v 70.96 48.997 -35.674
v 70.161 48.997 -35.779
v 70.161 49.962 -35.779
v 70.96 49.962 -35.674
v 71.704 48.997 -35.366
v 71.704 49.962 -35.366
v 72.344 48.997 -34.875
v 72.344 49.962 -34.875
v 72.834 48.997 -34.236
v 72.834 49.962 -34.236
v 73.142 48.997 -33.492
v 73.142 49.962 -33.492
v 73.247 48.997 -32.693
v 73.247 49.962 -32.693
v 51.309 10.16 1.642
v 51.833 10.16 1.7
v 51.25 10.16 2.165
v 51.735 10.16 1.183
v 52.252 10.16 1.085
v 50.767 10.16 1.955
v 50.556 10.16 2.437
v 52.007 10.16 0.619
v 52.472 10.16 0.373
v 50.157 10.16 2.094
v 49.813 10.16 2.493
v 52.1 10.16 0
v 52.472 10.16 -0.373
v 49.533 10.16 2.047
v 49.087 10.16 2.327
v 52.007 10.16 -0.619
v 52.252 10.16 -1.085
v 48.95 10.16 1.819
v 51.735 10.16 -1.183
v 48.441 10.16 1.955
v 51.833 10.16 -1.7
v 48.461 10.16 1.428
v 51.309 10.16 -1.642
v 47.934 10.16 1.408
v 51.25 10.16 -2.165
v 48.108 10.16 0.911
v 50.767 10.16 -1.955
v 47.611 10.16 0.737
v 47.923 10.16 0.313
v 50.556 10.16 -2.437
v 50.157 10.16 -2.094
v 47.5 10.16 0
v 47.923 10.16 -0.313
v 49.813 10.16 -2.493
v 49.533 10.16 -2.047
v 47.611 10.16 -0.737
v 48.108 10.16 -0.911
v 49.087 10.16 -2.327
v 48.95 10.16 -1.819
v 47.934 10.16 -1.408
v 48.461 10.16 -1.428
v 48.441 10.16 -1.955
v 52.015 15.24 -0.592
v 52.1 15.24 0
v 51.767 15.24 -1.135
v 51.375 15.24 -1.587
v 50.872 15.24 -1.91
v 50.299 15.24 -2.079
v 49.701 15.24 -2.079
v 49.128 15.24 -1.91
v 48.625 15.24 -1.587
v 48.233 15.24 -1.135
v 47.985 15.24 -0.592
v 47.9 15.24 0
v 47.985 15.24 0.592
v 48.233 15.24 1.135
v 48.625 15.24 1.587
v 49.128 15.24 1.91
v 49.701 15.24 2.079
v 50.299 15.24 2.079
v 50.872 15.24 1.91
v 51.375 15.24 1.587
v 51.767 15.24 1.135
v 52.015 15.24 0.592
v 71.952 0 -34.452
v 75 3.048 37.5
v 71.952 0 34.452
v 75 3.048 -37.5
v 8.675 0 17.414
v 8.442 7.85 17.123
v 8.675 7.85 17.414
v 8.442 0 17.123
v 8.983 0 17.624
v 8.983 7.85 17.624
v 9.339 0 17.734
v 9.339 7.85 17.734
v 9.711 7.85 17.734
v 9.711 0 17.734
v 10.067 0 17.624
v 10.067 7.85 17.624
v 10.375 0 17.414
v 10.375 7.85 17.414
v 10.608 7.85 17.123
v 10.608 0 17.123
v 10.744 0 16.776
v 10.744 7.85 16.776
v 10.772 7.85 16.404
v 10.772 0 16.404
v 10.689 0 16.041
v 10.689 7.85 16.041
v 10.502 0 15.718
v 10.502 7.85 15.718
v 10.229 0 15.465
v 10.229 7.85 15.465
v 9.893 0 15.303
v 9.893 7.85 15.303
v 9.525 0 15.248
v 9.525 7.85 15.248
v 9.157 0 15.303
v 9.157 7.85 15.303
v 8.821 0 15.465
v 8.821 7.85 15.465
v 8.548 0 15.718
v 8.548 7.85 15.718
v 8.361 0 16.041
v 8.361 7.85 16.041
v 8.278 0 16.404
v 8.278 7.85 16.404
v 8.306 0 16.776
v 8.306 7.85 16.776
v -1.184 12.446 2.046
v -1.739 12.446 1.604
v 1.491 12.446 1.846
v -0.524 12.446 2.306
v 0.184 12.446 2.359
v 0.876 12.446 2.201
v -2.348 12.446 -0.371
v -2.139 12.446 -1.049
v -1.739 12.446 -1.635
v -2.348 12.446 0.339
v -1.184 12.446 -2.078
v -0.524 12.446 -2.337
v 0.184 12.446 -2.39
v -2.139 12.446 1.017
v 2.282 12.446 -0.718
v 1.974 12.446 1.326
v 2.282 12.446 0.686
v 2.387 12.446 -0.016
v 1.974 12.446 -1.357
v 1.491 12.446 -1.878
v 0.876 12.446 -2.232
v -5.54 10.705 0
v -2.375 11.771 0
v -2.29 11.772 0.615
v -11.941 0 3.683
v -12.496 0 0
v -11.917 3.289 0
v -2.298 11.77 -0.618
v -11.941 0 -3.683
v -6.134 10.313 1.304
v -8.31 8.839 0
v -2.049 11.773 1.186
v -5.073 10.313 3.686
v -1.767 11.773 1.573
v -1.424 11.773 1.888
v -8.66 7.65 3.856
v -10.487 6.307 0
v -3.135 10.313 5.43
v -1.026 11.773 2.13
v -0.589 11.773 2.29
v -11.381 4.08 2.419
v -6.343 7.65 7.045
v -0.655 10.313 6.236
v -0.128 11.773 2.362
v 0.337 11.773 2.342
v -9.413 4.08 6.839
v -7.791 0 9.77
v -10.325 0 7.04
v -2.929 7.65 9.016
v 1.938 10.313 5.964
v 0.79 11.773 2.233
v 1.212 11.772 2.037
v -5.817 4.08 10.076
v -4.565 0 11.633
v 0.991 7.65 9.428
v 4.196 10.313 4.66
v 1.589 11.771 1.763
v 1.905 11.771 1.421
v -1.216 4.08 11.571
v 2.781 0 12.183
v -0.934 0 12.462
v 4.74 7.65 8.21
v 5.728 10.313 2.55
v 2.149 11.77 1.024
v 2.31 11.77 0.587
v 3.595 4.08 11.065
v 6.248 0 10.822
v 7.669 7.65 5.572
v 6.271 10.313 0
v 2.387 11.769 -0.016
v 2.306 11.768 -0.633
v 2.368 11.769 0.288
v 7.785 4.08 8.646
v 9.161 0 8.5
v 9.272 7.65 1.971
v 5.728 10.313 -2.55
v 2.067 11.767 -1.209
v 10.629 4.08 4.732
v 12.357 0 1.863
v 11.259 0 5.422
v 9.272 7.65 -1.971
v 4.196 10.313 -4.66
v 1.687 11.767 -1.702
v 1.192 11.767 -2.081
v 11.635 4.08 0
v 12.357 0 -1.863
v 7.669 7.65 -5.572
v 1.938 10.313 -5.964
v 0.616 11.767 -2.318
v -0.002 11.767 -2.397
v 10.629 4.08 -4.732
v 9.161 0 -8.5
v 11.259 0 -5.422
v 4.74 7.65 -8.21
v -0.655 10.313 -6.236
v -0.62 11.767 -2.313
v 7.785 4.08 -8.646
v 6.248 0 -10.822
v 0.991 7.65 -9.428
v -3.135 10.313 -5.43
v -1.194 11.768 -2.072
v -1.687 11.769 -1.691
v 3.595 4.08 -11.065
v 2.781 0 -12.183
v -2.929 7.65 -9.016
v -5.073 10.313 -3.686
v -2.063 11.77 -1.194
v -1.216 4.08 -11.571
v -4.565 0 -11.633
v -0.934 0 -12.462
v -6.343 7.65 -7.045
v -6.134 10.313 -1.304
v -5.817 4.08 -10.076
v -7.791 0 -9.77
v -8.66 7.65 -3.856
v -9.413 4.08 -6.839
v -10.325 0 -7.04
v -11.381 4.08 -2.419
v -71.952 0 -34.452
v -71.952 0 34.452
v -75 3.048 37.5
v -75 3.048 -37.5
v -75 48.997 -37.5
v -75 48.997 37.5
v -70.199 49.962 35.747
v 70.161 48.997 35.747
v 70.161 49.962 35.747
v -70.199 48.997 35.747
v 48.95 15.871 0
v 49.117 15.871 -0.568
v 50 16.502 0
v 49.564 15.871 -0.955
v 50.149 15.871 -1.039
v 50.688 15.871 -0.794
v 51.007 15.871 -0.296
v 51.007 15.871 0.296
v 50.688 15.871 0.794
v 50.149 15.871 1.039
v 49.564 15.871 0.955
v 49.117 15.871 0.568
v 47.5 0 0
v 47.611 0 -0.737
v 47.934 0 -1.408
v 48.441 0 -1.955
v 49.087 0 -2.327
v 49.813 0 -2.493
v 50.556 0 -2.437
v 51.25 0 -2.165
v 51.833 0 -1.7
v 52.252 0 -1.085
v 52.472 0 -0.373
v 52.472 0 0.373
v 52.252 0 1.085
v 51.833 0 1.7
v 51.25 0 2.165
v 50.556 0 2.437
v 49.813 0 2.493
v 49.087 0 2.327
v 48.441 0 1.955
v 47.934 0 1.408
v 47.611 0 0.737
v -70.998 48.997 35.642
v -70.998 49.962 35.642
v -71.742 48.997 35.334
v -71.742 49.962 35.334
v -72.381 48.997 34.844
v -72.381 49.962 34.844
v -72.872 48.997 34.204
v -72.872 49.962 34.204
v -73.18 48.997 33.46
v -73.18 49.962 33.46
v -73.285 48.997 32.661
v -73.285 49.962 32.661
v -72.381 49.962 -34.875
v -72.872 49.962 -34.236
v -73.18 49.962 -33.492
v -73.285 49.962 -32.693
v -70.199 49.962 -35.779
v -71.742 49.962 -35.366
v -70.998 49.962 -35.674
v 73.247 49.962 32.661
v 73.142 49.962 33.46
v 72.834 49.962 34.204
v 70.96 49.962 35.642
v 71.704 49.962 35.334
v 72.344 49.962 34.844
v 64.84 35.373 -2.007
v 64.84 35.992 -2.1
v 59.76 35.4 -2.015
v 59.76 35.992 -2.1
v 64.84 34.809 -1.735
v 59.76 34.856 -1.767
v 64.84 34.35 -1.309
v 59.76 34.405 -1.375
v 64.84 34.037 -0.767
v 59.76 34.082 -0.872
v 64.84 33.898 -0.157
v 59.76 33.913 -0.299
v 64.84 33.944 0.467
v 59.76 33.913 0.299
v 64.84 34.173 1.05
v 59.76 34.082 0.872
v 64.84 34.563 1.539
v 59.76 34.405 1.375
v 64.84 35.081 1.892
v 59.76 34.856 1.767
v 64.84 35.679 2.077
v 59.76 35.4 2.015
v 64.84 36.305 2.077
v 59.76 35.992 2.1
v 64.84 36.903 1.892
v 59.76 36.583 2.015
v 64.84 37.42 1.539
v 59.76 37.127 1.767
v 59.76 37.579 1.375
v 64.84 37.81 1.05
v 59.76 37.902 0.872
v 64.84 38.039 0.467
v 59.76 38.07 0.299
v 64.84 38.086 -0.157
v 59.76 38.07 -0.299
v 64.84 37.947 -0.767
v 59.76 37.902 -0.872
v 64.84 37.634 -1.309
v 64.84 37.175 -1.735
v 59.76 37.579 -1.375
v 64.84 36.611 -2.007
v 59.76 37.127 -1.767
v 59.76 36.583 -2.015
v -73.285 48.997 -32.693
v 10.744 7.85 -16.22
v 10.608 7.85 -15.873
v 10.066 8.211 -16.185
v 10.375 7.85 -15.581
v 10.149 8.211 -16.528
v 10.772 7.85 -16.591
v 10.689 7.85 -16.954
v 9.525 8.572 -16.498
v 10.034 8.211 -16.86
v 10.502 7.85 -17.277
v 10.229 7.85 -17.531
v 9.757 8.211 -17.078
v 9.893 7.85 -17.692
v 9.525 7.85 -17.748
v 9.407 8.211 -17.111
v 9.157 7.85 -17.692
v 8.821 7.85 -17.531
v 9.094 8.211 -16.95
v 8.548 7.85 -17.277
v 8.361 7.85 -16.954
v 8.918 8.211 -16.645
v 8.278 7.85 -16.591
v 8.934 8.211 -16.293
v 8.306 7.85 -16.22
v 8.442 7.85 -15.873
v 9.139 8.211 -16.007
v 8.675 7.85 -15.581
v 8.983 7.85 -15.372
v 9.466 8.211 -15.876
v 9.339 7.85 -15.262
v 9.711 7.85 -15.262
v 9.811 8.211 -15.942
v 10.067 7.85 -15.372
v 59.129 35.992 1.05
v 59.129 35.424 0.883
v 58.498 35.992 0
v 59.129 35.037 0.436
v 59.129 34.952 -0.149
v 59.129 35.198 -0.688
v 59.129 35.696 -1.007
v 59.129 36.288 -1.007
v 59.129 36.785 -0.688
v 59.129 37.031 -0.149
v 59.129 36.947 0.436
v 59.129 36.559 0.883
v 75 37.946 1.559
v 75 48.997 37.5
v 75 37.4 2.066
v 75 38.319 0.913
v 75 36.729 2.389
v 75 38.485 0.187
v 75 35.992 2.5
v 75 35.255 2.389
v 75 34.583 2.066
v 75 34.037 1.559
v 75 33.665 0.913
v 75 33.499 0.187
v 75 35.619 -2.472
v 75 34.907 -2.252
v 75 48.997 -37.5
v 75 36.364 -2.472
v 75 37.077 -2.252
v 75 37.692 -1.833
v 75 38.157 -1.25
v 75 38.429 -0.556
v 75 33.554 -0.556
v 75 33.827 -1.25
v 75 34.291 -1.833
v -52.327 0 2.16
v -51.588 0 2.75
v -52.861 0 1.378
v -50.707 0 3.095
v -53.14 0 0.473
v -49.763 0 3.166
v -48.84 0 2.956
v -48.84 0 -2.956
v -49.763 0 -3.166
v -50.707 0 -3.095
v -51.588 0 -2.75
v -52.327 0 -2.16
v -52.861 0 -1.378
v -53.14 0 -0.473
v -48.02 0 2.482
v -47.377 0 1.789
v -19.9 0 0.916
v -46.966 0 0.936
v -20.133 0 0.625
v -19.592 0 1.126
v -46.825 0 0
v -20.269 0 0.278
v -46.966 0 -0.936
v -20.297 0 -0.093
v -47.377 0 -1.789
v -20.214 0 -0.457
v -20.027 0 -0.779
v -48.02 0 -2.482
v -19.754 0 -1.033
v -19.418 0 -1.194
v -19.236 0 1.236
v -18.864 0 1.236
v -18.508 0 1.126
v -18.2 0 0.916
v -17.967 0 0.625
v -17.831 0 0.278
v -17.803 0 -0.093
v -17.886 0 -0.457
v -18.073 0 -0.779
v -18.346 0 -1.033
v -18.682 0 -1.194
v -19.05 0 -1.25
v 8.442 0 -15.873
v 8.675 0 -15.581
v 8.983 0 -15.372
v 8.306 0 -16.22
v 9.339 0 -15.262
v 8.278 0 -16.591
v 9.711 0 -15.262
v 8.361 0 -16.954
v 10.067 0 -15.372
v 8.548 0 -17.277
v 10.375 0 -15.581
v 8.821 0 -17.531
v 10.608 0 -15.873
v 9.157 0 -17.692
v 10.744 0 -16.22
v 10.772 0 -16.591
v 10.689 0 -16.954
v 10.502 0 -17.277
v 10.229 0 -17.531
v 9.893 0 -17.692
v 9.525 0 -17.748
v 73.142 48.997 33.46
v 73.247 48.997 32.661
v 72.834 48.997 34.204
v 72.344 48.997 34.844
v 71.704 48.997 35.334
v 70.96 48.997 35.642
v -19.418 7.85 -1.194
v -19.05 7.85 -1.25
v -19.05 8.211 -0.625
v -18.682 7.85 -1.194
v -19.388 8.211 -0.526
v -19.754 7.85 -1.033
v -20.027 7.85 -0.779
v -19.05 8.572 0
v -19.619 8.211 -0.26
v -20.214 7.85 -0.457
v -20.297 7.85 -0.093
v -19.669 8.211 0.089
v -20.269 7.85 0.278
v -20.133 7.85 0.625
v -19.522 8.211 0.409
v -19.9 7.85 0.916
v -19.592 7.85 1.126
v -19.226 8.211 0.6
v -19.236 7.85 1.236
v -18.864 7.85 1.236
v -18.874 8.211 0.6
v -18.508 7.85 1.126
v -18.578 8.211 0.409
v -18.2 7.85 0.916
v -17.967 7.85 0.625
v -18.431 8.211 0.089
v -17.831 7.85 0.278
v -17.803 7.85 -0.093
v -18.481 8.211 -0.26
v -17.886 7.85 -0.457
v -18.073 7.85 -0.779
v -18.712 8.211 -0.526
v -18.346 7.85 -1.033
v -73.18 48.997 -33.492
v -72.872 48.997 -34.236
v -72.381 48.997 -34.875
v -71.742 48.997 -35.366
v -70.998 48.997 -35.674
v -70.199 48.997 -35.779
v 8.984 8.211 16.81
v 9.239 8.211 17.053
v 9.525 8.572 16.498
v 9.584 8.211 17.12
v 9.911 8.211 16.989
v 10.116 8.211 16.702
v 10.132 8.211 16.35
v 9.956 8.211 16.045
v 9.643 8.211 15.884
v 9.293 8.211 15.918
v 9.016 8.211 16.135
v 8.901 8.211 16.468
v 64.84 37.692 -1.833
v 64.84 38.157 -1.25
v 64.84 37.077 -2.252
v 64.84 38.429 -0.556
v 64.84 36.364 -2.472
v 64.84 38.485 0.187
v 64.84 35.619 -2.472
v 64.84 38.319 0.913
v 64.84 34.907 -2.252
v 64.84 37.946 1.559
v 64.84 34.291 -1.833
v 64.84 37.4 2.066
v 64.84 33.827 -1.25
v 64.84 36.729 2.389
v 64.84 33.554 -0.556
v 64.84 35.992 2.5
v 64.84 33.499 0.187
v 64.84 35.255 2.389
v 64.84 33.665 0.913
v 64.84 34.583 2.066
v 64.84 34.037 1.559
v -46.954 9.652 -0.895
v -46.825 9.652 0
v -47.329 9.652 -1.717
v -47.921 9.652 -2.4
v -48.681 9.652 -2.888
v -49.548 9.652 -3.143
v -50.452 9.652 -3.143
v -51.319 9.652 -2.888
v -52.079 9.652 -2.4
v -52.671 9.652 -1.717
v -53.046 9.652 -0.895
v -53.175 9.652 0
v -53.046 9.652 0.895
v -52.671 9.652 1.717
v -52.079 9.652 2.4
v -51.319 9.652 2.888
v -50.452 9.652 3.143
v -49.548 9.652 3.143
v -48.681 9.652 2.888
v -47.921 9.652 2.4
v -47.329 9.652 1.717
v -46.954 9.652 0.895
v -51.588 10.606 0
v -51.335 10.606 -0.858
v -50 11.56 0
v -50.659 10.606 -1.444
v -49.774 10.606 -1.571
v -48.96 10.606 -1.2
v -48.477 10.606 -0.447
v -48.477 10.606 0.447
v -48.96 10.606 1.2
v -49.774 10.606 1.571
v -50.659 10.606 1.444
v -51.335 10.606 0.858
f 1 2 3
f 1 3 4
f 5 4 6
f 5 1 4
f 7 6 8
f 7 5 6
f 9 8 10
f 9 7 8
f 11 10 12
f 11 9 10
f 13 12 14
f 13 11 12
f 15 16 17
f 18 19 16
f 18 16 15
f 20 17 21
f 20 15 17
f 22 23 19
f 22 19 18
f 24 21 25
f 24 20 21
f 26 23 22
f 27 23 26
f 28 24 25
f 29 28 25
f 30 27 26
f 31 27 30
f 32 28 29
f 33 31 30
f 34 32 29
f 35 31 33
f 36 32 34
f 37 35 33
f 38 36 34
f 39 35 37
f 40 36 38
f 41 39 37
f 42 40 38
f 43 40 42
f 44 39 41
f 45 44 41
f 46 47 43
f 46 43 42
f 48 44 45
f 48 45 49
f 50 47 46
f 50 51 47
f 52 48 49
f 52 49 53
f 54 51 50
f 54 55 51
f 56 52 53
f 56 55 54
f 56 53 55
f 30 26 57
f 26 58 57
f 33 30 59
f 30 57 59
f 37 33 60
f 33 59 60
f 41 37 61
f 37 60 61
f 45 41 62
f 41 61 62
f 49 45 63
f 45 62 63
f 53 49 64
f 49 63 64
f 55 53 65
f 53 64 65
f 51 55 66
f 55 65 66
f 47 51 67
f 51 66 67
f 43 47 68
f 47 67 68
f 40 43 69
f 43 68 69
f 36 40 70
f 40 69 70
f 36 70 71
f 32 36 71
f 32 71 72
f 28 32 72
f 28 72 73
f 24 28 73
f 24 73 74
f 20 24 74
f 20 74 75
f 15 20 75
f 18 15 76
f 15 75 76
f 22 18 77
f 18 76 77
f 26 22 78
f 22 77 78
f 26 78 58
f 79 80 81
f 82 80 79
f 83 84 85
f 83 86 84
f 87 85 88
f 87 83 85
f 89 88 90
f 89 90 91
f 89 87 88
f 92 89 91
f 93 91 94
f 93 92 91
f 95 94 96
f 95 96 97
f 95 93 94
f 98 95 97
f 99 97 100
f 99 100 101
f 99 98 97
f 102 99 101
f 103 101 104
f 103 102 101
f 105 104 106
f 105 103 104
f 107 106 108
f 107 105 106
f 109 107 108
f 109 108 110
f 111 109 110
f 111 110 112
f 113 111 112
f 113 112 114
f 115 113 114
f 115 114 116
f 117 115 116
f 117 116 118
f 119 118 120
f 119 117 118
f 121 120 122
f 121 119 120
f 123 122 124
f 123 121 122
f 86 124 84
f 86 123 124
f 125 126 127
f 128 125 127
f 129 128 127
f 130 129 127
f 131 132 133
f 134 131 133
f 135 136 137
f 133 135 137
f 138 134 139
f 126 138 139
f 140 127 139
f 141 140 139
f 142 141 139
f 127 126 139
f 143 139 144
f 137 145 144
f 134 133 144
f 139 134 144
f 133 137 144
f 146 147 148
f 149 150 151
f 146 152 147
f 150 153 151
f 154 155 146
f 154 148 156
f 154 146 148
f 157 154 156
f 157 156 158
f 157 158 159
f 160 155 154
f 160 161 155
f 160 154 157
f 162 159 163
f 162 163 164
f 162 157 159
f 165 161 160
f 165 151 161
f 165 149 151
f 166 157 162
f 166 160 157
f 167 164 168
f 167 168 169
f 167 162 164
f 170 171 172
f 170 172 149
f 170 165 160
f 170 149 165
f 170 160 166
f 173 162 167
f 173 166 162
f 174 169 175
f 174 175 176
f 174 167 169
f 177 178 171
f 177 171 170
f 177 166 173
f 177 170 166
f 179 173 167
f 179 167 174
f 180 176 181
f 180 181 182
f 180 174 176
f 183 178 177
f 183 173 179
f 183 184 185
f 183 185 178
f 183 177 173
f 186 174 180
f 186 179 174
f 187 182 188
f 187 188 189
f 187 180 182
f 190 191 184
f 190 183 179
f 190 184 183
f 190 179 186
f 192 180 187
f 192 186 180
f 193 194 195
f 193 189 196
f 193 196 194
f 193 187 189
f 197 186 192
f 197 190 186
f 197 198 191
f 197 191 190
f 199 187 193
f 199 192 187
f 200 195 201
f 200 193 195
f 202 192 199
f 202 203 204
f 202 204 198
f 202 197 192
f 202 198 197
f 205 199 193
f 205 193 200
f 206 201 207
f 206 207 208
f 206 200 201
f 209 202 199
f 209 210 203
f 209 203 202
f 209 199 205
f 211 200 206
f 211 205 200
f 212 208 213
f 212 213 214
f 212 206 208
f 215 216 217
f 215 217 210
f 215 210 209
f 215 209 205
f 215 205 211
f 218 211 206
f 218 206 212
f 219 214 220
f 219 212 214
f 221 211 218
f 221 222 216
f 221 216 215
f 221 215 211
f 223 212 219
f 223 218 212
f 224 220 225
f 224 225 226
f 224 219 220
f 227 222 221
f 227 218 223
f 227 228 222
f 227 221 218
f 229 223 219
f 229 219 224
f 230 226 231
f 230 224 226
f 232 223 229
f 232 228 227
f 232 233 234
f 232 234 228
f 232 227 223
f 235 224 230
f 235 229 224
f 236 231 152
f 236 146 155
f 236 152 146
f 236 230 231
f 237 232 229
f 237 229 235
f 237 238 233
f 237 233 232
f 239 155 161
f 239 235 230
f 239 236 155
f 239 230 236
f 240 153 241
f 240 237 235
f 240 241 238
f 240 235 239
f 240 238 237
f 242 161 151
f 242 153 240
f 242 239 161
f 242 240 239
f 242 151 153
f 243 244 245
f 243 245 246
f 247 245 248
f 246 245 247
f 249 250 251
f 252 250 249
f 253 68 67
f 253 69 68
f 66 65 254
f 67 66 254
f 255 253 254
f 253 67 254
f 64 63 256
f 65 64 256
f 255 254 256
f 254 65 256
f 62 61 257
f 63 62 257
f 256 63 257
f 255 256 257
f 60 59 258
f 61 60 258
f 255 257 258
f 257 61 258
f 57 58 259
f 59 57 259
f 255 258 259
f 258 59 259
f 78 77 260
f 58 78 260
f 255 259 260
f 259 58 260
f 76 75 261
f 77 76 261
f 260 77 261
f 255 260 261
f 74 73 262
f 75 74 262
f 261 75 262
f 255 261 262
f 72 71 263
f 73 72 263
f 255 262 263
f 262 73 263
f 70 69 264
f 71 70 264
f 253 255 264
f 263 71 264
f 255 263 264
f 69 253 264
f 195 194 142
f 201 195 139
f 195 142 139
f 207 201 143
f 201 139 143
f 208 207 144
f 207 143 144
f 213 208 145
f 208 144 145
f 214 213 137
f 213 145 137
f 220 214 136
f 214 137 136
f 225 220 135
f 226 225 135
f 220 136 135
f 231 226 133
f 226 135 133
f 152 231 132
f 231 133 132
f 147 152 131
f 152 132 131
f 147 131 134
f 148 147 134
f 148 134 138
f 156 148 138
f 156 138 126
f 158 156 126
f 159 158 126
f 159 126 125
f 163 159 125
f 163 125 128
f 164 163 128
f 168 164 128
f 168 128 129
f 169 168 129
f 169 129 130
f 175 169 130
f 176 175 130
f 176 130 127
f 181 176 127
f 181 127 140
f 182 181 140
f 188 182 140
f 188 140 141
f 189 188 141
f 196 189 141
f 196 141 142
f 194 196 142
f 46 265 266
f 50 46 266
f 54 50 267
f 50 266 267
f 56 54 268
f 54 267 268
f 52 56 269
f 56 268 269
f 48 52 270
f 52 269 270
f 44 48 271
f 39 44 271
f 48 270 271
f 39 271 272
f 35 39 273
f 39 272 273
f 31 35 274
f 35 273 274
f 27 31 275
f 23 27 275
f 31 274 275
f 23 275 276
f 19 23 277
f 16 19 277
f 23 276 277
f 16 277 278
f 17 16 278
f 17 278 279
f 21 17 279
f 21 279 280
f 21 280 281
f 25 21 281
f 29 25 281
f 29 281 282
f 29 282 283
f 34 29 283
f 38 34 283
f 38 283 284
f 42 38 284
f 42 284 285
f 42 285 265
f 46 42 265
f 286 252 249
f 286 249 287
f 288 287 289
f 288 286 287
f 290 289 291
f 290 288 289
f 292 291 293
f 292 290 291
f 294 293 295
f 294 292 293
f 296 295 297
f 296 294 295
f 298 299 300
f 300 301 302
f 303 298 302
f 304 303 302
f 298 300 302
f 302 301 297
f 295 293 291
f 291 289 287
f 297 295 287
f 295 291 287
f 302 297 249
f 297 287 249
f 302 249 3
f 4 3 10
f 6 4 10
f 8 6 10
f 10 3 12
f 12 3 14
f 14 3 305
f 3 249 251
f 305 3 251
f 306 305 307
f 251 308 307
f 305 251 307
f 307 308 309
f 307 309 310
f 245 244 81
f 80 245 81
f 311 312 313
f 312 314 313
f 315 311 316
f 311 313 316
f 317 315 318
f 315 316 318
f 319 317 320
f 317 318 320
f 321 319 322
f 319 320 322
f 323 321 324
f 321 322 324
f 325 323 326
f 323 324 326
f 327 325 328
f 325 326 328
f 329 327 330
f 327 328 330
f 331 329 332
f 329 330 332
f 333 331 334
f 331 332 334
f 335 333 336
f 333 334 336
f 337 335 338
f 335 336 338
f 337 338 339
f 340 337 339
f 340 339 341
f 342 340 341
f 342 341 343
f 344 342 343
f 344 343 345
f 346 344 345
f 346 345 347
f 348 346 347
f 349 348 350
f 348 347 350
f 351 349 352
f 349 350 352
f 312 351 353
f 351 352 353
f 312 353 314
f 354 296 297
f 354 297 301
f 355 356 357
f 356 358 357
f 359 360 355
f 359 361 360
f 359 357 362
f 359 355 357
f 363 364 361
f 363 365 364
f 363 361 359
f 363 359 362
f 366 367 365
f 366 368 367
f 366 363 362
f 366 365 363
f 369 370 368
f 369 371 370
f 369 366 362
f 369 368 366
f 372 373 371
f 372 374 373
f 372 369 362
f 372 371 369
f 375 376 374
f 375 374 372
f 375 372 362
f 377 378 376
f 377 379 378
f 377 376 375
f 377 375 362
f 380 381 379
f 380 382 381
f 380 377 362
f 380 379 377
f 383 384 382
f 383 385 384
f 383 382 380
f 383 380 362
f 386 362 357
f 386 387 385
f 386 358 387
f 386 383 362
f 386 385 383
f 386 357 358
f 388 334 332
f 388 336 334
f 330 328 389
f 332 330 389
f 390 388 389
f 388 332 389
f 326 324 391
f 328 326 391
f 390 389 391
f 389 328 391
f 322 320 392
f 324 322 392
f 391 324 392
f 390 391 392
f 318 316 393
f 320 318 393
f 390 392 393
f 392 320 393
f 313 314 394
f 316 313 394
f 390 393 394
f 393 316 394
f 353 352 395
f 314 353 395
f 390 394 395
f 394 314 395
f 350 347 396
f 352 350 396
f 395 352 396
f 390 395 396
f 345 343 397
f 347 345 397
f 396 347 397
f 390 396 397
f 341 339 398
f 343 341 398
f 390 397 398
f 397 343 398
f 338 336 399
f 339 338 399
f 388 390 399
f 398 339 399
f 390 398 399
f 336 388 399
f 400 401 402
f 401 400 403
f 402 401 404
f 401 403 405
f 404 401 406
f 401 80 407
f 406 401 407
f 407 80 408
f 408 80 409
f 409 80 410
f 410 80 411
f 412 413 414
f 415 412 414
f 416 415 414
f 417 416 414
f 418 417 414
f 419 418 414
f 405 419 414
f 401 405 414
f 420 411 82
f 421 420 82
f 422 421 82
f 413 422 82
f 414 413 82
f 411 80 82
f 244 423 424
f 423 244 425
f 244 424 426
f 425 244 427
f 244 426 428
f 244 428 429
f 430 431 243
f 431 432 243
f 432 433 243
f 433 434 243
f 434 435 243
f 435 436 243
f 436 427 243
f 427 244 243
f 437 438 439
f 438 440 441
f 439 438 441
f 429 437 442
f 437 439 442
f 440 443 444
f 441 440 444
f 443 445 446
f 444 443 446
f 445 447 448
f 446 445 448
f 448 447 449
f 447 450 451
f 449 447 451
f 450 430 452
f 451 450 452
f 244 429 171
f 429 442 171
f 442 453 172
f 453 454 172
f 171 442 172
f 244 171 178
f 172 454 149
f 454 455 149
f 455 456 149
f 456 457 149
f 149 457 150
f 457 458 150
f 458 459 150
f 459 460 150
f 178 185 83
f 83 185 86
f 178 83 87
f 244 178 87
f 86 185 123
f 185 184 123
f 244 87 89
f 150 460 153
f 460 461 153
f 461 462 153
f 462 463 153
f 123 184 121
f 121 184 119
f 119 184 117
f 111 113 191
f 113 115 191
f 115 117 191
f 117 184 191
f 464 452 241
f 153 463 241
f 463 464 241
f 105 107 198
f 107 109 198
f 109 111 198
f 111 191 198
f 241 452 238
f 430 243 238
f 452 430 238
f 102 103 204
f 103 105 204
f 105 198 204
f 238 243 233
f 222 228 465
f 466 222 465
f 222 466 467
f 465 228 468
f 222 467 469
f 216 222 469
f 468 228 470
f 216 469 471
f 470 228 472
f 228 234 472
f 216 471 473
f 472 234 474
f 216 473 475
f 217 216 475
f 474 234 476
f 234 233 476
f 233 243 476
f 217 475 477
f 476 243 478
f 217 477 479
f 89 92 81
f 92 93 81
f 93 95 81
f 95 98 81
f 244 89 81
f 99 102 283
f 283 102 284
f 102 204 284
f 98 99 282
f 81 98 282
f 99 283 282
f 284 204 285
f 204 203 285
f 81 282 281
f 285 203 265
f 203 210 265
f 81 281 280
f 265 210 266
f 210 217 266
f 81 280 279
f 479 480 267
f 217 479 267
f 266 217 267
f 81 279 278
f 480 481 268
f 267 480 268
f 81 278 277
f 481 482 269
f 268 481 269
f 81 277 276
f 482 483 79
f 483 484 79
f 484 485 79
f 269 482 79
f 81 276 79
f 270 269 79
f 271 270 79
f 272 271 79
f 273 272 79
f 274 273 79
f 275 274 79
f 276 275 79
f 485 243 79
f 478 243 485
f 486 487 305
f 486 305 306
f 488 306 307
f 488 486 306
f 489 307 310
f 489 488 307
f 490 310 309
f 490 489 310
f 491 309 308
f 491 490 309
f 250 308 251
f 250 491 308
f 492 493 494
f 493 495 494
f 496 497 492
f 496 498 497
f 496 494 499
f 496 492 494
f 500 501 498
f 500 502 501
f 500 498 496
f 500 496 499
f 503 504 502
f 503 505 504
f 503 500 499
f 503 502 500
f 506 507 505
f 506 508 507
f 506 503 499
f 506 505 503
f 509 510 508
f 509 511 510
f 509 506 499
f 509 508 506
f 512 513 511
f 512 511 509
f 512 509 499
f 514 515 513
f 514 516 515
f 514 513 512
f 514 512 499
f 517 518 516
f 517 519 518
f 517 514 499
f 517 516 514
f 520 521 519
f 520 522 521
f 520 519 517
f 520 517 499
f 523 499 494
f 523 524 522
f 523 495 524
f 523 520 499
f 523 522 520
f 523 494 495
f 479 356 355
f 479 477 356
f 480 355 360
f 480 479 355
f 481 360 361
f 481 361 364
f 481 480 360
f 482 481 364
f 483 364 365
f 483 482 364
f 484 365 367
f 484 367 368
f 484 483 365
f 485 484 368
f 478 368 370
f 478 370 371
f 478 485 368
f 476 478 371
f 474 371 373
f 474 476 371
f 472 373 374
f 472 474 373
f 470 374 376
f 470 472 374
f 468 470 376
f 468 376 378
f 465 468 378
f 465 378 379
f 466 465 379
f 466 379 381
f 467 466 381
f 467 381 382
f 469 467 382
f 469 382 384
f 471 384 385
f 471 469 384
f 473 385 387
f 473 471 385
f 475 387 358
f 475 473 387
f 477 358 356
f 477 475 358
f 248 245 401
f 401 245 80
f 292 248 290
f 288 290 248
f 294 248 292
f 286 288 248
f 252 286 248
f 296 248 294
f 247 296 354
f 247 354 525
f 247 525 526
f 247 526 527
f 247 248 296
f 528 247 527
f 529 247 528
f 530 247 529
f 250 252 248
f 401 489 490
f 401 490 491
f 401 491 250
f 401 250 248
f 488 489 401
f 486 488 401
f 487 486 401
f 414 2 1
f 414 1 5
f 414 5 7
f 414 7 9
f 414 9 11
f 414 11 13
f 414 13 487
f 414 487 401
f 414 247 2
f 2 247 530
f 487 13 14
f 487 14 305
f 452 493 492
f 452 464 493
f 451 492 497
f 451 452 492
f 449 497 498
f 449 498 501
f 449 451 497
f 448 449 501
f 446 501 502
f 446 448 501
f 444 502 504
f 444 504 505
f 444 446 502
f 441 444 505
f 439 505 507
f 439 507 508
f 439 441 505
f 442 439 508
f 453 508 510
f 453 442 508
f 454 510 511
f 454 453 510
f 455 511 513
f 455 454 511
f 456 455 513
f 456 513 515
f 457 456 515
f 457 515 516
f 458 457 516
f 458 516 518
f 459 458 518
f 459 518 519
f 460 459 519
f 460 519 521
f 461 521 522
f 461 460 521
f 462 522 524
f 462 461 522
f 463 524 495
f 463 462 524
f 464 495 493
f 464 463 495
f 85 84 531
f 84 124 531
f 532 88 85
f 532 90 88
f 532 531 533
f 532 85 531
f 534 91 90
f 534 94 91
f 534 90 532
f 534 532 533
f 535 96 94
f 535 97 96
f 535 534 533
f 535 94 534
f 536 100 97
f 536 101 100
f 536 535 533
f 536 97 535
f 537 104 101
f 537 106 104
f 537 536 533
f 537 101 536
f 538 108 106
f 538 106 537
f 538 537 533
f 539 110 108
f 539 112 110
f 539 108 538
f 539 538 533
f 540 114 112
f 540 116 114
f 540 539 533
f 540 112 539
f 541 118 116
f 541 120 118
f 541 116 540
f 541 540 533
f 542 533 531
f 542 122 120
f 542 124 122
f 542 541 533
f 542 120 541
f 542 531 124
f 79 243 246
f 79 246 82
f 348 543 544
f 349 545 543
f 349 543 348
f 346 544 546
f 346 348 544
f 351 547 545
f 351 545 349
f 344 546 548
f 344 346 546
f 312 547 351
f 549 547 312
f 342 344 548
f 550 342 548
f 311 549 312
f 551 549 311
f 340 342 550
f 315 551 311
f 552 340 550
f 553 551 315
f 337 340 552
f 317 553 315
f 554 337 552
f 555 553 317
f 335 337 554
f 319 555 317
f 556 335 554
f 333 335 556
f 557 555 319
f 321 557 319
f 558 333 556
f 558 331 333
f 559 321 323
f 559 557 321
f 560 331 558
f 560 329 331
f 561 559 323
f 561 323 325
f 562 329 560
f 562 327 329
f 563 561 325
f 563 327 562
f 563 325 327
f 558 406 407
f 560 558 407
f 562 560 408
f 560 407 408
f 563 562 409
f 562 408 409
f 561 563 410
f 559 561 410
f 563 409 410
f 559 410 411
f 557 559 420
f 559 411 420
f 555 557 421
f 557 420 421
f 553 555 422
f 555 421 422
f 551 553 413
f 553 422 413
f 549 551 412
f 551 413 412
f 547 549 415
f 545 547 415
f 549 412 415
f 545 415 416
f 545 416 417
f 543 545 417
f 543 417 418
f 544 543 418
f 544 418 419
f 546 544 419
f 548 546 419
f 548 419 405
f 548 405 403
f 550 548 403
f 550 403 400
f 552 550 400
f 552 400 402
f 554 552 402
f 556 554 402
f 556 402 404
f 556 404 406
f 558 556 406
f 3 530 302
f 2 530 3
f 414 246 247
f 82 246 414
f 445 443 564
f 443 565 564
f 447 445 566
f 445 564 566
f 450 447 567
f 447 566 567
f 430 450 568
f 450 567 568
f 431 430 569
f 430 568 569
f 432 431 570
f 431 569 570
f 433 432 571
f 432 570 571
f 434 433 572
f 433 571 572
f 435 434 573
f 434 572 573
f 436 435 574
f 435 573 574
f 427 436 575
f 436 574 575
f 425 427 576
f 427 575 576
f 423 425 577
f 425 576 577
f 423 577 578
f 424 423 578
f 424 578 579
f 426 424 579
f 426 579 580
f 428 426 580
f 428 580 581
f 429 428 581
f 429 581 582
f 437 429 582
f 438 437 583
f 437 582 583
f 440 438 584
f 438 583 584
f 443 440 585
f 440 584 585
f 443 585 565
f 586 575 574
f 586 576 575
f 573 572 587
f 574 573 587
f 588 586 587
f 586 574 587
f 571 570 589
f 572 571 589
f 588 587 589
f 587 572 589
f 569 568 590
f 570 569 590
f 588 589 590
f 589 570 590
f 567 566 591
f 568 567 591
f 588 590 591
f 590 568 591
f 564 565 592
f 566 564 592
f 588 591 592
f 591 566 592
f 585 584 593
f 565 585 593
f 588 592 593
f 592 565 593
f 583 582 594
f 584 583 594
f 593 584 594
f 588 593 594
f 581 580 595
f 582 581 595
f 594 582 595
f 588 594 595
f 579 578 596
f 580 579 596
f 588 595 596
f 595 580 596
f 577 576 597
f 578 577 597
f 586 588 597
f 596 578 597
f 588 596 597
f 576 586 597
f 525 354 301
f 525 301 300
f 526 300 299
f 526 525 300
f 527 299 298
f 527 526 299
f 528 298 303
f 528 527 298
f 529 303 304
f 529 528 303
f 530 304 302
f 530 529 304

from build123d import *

# Parameters (mm, degrees)
SKETCH1_W                          = 150
SKETCH1_H                          = 75
EXTRUDE1_DEPTH                     = 48.9966
CIRPATTERN1_COUNT                  = 3
M5X0_8_TAPPED_HOLE1_D              = 4.2
M5X0_8_TAPPED_HOLE1_DEPTH          = 15.24
M5X0_8_TAPPED_HOLE1_CBORE_D        = 5
M5X0_8_TAPPED_HOLE1_CBORE_DEPTH    = 10.16
M5X0_8_TAPPED_HOLE1_TIP            = 1.2618073
F_1_4_0_25_DIAMETER_HOLE1_D        = 6.35
F_1_4_0_25_DIAMETER_HOLE1_DEPTH    = 9.652
F_1_4_0_25_DIAMETER_HOLE1_TIP      = 1.907732465
M5X0_8_TAPPED_HOLE2_D              = 4.2
M5X0_8_TAPPED_HOLE2_DEPTH          = 15.24
M5X0_8_TAPPED_HOLE2_CBORE_D        = 5
M5X0_8_TAPPED_HOLE2_CBORE_DEPTH    = 10.16
M5X0_8_TAPPED_HOLE2_TIP            = 1.2618073
F_3_16_0_1875_DIAMETER_HOLE1_D     = 4.7625
F_3_16_0_1875_DIAMETER_HOLE1_DEPTH = 12.446
CHAMFER1_SIZE                      = 3.048
EXTRUDE2_DEPTH                     = 0.96519992


with BuildPart() as part:
    # Sketch1 → Extrude1 (new body)
    with BuildSketch(Plane(origin=(0, 0, 0), x_dir=(1, 0, 0), z_dir=(0, 1, 0))):
        Rectangle(SKETCH1_W, SKETCH1_H)
    extrude(amount=EXTRUDE1_DEPTH)

    # Sketch3 → Cut-Revolve1 (revolve, cut)
    with BuildSketch(Plane.XY):
        with BuildLine():
            Line((0, -13.0148), (0, 11.9988))
            ThreePointArc((0, 11.9988), (-12.5068, -0.508), (0, -13.0148))
        make_face()
    revolve(axis=Axis((0, -13.0148, 0), (0, 1, 0)), mode=Mode.SUBTRACT)

    # Sketch4 → M3x0.5 Tapped Hole1 (revolve, cut)
    with BuildSketch(Plane(origin=(-19.05, 0, 0), x_dir=(0, 0, -1), z_dir=(1, 0, 0))):
        Polygon((0, 0), (0, 8.571684836), (1.25, 7.849997), (1.25, 0), align=None)
    m3x0_5_tapped_hole1 = revolve(axis=Axis((-19.05, -6.35, 0), (0, 1, 0)), mode=Mode.SUBTRACT)

    # CirPattern1: M3x0.5 Tapped Hole1 ×3 about axis
    cirpattern1_axis = Axis((0, 0, 0), (0, 1, 0))
    for i in range(1, CIRPATTERN1_COUNT):
        add(m3x0_5_tapped_hole1.rotate(cirpattern1_axis, i * 360 / CIRPATTERN1_COUNT), mode=Mode.SUBTRACT)

    # M5x0.8 Tapped Hole1
    with Locations(Plane(origin=(3.180539722, 0, -8.853139463), x_dir=(-1, 0, 0), z_dir=(0, -1, 0))):
        with Locations((-46.819460278, -8.853139463)):
            CounterBoreHole(M5X0_8_TAPPED_HOLE1_D / 2, M5X0_8_TAPPED_HOLE1_CBORE_D / 2, M5X0_8_TAPPED_HOLE1_CBORE_DEPTH, depth=M5X0_8_TAPPED_HOLE1_DEPTH)
            with Locations((0, 0, -(M5X0_8_TAPPED_HOLE1_DEPTH + M5X0_8_TAPPED_HOLE1_TIP / 2))):  # 118° drill point
                Cone(0, M5X0_8_TAPPED_HOLE1_D / 2, M5X0_8_TAPPED_HOLE1_TIP, mode=Mode.SUBTRACT)

    # 1_4 _0.25_ Diameter Hole1
    with Locations(Plane(origin=(7.783143684, 0, 5.786983083), x_dir=(-1, 0, 0), z_dir=(0, -1, 0))):
        with Locations((57.783143684, 5.786983083)):
            Hole(F_1_4_0_25_DIAMETER_HOLE1_D / 2, depth=F_1_4_0_25_DIAMETER_HOLE1_DEPTH)
            with Locations((0, 0, -(F_1_4_0_25_DIAMETER_HOLE1_DEPTH + F_1_4_0_25_DIAMETER_HOLE1_TIP / 2))):  # 118° drill point
                Cone(0, F_1_4_0_25_DIAMETER_HOLE1_D / 2, F_1_4_0_25_DIAMETER_HOLE1_TIP, mode=Mode.SUBTRACT)

    # M5x0.8 Tapped Hole2
    with Locations(Plane(origin=(75, -6.107751103, -10.810874371), x_dir=(0, 0, 1), z_dir=(1, 0, 0))):
        with Locations((10.810874371, -42.099551103)):
            CounterBoreHole(M5X0_8_TAPPED_HOLE2_D / 2, M5X0_8_TAPPED_HOLE2_CBORE_D / 2, M5X0_8_TAPPED_HOLE2_CBORE_DEPTH, depth=M5X0_8_TAPPED_HOLE2_DEPTH)
            with Locations((0, 0, -(M5X0_8_TAPPED_HOLE2_DEPTH + M5X0_8_TAPPED_HOLE2_TIP / 2))):  # 118° drill point
                Cone(0, M5X0_8_TAPPED_HOLE2_D / 2, M5X0_8_TAPPED_HOLE2_TIP, mode=Mode.SUBTRACT)

    # 3_16 _0.1875_ Diameter Hole1
    with Locations(Plane(origin=(-43.604904101, 0, -18.203855586), x_dir=(-1, 0, 0), z_dir=(0, -1, 0))):
        with Locations((-43.611104101, -18.188055586)):
            Hole(F_3_16_0_1875_DIAMETER_HOLE1_D / 2, depth=F_3_16_0_1875_DIAMETER_HOLE1_DEPTH)

    # Chamfer1
    chamfer1_edges = [part.edges().sort_by_distance(p)[0] for p in [
        (0, 0, -37.5),
        (75, 0, 0),
        (0, 0, 37.5),
        (-75, 0, 0),
    ]]
    chamfer(chamfer1_edges, length=CHAMFER1_SIZE)

    # Sketch14 → Extrude2 (add)
    with BuildSketch(Plane.XZ.offset(-48.9966)):
        with BuildLine():
            Line((70.1613, 35.7474), (-70.1991, 35.7474))
            ThreePointArc((-70.1991, 35.7474), (-72.381302237, 34.843502237), (-73.2852, 32.6613))
            Line((-73.2852, 32.6613), (-73.2852, -32.6929))
            ThreePointArc((-73.2852, -32.6929), (-72.381302237, -34.875102237), (-70.1991, -35.779))
            Line((-70.1991, -35.779), (70.1613, -35.779))
            ThreePointArc((70.1613, -35.779), (72.343502237, -34.875102237), (73.2474, -32.6929))
            Line((73.2474, -32.6929), (73.2474, 32.6613))
            ThreePointArc((73.2474, 32.6613), (72.343502237, 34.843502237), (70.1613, 35.7474))
        make_face()
    extrude(amount=-EXTRUDE2_DEPTH)


solid = part.part
